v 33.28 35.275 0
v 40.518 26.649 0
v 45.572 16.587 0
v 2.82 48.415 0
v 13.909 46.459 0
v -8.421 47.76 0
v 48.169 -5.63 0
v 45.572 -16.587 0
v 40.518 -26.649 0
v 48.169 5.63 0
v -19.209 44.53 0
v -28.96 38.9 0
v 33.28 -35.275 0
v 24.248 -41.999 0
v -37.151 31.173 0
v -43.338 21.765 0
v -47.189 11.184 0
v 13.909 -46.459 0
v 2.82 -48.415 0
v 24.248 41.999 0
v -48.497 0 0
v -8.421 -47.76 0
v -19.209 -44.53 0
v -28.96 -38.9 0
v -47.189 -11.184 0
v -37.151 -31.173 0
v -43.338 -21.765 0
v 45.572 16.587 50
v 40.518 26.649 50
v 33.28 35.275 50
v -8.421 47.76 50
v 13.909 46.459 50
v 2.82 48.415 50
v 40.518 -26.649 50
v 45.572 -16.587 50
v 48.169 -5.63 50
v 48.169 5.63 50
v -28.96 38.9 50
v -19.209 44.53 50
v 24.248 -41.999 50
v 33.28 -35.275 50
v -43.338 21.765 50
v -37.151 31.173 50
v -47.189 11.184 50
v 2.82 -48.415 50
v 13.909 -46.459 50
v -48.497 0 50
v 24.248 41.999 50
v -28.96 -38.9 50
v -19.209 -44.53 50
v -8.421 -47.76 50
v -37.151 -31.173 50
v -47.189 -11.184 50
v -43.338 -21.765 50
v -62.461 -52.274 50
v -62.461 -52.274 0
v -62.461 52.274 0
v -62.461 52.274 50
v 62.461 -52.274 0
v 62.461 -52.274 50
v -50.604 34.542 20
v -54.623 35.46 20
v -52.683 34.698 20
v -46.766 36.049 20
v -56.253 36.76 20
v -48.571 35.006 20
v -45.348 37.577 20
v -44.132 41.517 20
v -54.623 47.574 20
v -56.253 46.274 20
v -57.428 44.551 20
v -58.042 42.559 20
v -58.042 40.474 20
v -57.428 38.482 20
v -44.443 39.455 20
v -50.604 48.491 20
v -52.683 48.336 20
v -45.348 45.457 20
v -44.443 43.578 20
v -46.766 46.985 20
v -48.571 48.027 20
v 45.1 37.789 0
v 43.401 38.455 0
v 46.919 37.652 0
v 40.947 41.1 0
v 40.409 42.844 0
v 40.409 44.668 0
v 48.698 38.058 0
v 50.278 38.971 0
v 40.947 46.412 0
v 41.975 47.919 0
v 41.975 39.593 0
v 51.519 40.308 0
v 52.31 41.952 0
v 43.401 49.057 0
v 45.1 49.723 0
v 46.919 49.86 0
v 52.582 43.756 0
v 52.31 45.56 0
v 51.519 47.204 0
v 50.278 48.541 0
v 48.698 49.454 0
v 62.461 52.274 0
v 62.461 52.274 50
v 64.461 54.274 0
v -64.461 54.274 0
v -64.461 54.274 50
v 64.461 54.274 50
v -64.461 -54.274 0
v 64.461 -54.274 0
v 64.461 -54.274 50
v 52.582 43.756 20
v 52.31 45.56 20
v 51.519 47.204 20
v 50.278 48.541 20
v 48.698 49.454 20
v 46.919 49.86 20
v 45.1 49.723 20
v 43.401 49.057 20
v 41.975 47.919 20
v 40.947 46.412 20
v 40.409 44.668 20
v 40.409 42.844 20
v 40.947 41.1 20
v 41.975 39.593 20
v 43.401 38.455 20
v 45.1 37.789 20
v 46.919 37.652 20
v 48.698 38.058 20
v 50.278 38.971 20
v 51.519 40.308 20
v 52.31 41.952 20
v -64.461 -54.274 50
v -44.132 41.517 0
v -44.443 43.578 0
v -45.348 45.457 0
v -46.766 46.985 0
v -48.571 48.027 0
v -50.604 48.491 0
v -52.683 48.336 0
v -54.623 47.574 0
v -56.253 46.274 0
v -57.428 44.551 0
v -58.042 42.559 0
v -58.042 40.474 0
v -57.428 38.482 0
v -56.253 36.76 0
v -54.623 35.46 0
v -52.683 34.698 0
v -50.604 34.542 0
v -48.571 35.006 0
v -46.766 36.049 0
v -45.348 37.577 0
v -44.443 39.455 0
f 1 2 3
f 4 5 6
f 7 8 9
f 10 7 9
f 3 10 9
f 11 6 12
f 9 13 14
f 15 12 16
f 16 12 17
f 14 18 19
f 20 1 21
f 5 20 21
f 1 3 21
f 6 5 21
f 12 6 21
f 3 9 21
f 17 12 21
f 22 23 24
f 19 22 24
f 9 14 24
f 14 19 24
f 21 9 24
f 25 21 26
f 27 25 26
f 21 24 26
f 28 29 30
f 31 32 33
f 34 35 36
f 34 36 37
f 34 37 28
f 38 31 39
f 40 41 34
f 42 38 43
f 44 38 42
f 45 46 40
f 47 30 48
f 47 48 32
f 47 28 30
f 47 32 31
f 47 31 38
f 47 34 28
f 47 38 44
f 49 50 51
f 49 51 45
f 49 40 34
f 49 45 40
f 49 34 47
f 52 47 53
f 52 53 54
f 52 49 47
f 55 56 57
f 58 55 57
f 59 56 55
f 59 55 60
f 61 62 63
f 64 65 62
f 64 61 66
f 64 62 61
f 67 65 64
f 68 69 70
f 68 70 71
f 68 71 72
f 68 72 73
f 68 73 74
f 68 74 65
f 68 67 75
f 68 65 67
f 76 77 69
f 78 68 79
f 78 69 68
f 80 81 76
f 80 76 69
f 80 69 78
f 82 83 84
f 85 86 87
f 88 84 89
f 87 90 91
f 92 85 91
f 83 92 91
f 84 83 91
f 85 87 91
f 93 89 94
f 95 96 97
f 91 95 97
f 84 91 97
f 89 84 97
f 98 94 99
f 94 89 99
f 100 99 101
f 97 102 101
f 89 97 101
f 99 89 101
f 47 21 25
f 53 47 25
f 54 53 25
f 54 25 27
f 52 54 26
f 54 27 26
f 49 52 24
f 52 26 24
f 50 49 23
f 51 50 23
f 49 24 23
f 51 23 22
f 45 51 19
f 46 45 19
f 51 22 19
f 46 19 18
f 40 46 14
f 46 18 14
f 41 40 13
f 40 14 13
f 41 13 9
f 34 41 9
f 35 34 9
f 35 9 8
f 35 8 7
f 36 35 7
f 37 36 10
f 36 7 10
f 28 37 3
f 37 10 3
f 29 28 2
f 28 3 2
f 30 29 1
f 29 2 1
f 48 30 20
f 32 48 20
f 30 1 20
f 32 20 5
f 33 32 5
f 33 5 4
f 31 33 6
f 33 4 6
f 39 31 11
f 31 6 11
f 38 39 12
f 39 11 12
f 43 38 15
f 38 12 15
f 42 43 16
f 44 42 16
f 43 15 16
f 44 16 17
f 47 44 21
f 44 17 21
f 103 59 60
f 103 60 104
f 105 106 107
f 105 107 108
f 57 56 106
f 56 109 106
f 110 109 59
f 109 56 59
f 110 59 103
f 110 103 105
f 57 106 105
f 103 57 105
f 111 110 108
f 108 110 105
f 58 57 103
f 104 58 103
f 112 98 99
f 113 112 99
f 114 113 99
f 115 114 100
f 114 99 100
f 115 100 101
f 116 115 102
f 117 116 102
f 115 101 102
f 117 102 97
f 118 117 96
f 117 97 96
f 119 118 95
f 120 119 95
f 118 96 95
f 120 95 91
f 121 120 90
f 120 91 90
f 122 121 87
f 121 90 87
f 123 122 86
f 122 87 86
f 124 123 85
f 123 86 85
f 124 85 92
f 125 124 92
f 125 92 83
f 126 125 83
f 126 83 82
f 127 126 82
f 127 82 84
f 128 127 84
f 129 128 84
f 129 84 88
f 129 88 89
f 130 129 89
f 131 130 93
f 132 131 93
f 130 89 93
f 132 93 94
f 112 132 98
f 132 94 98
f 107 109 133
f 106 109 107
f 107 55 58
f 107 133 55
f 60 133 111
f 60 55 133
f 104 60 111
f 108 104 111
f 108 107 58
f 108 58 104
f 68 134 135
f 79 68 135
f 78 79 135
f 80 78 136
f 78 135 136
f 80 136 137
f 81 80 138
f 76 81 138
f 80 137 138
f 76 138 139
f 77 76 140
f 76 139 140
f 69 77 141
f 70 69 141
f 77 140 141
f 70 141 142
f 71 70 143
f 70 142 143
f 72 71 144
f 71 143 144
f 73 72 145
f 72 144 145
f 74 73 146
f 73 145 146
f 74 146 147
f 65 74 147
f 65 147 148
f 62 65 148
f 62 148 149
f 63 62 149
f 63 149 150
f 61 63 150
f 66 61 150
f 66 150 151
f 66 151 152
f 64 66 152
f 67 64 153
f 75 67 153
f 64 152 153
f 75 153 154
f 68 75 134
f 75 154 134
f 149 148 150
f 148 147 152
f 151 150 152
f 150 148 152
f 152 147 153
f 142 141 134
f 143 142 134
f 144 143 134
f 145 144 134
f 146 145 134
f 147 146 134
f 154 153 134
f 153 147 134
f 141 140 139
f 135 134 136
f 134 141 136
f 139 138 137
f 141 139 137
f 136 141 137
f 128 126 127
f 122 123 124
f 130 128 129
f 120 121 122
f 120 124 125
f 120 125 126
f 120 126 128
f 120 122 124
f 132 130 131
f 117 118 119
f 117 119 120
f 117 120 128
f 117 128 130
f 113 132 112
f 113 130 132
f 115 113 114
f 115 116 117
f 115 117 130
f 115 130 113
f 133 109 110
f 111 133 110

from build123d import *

# Parameters (mm, degrees)
SKETCH1_W             = 128.922622712
SKETCH1_H             = 108.547542538
SKETCH1_W_2           = 124.922622712
SKETCH1_H_2           = 104.547542538
BOSS_EXTRUDE1_DEPTH   = 50
SKETCH2_R             = 48.496570744
BOSS_EXTRUDE2_DEPTH   = 50
SKETCH3_R             = 6.994110628
BOSS_EXTRUDE3_DEPTH   = 20
SKETCH3_R_2           = 6.120691225
BOSS_EXTRUDE3_2_DEPTH = 20


with BuildPart() as part:
    # Sketch1 → Boss-Extrude1 (new body)
    with BuildSketch(Plane.XY):
        Rectangle(SKETCH1_W, SKETCH1_H)
        Rectangle(SKETCH1_W_2, SKETCH1_H_2, mode=Mode.SUBTRACT)
    extrude(amount=BOSS_EXTRUDE1_DEPTH)


with BuildPart() as body_2:
    # Sketch2 → Boss-Extrude2 (new body)
    with BuildSketch(Plane.XY):
        with Locations(Location((0, 0, 0), (0, 0, 180))):
            Circle(SKETCH2_R)
    extrude(amount=BOSS_EXTRUDE2_DEPTH)


with BuildPart() as body_3:
    # Sketch3 → Boss-Extrude3 (new body)
    with BuildSketch(Plane.XY):
        with Locations((-51.126362865, 41.516845757)):
            Circle(SKETCH3_R)
    extrude(amount=BOSS_EXTRUDE3_DEPTH)


with BuildPart() as body_4:
    # Sketch3 → Boss-Extrude3 2 (new body)
    with BuildSketch(Plane.XY):
        with Locations((46.461548735, 43.755956539)):
            Circle(SKETCH3_R_2)
    extrude(amount=BOSS_EXTRUDE3_2_DEPTH)


solid = Compound([part.part, body_2.part, body_3.part, body_4.part])
